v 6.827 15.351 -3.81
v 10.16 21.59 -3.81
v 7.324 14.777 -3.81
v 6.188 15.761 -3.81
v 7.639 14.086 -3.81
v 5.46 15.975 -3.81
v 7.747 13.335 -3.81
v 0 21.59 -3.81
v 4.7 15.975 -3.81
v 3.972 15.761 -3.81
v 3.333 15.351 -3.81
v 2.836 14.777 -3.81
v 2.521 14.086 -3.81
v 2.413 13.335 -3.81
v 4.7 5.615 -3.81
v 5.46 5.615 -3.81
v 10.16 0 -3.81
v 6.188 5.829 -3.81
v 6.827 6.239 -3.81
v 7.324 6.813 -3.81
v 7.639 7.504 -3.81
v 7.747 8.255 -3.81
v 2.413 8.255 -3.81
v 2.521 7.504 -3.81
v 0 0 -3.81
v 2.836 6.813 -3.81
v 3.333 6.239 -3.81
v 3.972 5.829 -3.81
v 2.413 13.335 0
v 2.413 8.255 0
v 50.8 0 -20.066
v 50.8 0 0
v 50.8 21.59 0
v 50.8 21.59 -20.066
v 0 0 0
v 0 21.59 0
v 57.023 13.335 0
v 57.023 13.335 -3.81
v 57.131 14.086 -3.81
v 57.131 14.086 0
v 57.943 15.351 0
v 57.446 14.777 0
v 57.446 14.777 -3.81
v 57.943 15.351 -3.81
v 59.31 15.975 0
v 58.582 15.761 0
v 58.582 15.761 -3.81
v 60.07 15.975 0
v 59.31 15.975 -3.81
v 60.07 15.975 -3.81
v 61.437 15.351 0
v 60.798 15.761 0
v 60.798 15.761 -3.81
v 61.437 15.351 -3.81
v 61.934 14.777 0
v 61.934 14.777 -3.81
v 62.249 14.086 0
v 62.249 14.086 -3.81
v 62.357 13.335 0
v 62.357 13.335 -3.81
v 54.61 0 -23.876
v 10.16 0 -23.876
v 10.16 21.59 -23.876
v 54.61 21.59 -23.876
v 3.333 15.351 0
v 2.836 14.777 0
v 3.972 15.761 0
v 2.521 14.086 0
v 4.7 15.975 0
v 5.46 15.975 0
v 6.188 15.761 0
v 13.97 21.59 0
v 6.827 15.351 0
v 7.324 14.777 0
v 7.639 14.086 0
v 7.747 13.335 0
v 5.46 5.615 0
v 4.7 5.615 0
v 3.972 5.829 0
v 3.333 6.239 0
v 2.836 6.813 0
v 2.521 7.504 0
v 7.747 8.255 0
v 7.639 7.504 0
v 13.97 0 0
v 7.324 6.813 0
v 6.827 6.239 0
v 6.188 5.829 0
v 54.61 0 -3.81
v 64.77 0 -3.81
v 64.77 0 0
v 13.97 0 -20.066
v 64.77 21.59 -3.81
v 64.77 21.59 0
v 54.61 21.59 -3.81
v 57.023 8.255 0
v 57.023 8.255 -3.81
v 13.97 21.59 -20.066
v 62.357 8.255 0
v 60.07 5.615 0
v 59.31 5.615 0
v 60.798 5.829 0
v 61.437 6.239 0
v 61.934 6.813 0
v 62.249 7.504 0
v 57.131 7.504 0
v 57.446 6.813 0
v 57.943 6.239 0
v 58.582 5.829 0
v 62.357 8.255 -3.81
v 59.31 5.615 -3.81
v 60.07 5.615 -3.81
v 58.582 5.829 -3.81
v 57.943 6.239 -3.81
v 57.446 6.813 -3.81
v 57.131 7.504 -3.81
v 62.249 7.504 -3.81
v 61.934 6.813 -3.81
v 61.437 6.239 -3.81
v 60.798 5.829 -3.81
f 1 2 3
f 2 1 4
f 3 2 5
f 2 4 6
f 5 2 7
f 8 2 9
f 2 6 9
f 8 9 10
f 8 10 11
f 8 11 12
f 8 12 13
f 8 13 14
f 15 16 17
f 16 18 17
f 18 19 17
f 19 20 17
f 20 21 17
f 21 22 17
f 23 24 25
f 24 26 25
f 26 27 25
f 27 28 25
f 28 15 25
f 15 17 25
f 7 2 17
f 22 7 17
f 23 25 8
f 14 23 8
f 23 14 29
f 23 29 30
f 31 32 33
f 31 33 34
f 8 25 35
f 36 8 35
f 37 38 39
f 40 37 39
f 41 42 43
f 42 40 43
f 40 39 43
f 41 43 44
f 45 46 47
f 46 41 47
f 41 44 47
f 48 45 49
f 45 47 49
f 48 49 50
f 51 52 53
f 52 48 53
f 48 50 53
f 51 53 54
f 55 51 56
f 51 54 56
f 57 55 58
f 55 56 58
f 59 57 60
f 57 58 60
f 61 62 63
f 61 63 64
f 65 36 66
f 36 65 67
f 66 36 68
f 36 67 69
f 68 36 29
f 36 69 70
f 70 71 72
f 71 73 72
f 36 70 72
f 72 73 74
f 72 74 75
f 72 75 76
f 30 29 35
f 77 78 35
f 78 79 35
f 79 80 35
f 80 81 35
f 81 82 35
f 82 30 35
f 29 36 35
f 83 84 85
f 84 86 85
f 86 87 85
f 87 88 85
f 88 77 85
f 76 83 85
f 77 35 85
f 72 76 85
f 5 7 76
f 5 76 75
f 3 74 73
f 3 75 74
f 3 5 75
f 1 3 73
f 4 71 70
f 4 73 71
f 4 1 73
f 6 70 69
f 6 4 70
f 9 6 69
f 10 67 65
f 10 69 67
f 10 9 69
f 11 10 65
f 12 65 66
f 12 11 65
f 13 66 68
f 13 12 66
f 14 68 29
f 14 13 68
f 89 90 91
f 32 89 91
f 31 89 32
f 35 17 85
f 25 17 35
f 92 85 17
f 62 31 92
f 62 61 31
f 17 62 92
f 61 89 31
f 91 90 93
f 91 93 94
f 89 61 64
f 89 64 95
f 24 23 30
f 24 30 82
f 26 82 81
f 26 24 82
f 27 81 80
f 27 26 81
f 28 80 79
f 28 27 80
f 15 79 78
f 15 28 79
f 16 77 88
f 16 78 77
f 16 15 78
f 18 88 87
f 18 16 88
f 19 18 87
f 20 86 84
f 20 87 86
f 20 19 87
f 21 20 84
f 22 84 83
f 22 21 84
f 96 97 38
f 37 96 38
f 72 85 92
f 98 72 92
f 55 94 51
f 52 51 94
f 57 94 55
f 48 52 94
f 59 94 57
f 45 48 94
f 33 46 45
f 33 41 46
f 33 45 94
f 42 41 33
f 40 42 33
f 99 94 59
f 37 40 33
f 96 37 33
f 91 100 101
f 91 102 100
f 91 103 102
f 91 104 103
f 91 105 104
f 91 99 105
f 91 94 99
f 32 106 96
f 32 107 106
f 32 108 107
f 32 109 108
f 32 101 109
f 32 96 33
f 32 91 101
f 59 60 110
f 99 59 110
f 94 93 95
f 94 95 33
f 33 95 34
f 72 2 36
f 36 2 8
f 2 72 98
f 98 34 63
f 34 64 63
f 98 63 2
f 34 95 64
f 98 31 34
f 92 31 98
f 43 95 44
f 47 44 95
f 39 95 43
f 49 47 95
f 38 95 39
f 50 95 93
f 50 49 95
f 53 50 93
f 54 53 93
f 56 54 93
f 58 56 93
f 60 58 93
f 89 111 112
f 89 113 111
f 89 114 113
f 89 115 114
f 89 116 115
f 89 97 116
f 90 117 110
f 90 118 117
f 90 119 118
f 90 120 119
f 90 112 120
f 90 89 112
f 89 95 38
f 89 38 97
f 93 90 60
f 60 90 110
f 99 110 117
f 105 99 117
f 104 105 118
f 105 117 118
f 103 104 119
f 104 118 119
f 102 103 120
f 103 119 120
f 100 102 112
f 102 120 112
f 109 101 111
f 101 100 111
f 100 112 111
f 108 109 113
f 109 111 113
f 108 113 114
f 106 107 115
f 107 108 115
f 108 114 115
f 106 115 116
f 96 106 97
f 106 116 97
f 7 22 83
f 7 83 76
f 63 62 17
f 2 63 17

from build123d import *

# Parameters (mm, degrees)
BASE_DEPTH     = 21.59
BOLTHOLE_REACH = 45.79


with BuildPart() as part:
    # Sketch4 → base (new body)
    with BuildSketch(Plane(origin=(0, 0, 0), x_dir=(1, 0, 0), z_dir=(0, 1, 0))):
        Polygon((0, 0), (13.97, 0), (13.97, 20.066), (32.385, 20.066), (32.385, 23.876), (10.16, 23.876), (10.16, 3.81), (0, 3.81), align=None)
    base = extrude(amount=BASE_DEPTH)

    # Sketch5 → bolthole (cut, up to next)
    with BuildSketch(Plane(origin=(0, 0, -3.81), x_dir=(-1, 0, 0), z_dir=(0, 0, -1)), mode=Mode.PRIVATE) as bolthole_sk1:
        with BuildLine():
            Line((-2.413, 13.335), (-2.413, 8.255))
            ThreePointArc((-2.413, 8.255), (-5.08, 5.588), (-7.747, 8.255))
            Line((-7.747, 8.255), (-7.747, 13.335))
            ThreePointArc((-7.747, 13.335), (-5.08, 16.002), (-2.413, 13.335))
        make_face()
    bolthole_tool1 = extrude(bolthole_sk1.sketch, amount=-BOLTHOLE_REACH, mode=Mode.PRIVATE) & part.part
    bolthole = bolthole_tool1.solids().sort_by_distance((5.08, 10.795, -3.81))[0]
    add(bolthole, mode=Mode.SUBTRACT)

    # Mirror1: base, bolthole across plane
    add(base.mirror(Plane(origin=(32.385, 21.59, -20.066), x_dir=(0, 0, 1), z_dir=(-1, 0, 0))))
    add(bolthole.mirror(Plane(origin=(32.385, 21.59, -20.066), x_dir=(0, 0, 1), z_dir=(-1, 0, 0))), mode=Mode.SUBTRACT)


solid = part.part
